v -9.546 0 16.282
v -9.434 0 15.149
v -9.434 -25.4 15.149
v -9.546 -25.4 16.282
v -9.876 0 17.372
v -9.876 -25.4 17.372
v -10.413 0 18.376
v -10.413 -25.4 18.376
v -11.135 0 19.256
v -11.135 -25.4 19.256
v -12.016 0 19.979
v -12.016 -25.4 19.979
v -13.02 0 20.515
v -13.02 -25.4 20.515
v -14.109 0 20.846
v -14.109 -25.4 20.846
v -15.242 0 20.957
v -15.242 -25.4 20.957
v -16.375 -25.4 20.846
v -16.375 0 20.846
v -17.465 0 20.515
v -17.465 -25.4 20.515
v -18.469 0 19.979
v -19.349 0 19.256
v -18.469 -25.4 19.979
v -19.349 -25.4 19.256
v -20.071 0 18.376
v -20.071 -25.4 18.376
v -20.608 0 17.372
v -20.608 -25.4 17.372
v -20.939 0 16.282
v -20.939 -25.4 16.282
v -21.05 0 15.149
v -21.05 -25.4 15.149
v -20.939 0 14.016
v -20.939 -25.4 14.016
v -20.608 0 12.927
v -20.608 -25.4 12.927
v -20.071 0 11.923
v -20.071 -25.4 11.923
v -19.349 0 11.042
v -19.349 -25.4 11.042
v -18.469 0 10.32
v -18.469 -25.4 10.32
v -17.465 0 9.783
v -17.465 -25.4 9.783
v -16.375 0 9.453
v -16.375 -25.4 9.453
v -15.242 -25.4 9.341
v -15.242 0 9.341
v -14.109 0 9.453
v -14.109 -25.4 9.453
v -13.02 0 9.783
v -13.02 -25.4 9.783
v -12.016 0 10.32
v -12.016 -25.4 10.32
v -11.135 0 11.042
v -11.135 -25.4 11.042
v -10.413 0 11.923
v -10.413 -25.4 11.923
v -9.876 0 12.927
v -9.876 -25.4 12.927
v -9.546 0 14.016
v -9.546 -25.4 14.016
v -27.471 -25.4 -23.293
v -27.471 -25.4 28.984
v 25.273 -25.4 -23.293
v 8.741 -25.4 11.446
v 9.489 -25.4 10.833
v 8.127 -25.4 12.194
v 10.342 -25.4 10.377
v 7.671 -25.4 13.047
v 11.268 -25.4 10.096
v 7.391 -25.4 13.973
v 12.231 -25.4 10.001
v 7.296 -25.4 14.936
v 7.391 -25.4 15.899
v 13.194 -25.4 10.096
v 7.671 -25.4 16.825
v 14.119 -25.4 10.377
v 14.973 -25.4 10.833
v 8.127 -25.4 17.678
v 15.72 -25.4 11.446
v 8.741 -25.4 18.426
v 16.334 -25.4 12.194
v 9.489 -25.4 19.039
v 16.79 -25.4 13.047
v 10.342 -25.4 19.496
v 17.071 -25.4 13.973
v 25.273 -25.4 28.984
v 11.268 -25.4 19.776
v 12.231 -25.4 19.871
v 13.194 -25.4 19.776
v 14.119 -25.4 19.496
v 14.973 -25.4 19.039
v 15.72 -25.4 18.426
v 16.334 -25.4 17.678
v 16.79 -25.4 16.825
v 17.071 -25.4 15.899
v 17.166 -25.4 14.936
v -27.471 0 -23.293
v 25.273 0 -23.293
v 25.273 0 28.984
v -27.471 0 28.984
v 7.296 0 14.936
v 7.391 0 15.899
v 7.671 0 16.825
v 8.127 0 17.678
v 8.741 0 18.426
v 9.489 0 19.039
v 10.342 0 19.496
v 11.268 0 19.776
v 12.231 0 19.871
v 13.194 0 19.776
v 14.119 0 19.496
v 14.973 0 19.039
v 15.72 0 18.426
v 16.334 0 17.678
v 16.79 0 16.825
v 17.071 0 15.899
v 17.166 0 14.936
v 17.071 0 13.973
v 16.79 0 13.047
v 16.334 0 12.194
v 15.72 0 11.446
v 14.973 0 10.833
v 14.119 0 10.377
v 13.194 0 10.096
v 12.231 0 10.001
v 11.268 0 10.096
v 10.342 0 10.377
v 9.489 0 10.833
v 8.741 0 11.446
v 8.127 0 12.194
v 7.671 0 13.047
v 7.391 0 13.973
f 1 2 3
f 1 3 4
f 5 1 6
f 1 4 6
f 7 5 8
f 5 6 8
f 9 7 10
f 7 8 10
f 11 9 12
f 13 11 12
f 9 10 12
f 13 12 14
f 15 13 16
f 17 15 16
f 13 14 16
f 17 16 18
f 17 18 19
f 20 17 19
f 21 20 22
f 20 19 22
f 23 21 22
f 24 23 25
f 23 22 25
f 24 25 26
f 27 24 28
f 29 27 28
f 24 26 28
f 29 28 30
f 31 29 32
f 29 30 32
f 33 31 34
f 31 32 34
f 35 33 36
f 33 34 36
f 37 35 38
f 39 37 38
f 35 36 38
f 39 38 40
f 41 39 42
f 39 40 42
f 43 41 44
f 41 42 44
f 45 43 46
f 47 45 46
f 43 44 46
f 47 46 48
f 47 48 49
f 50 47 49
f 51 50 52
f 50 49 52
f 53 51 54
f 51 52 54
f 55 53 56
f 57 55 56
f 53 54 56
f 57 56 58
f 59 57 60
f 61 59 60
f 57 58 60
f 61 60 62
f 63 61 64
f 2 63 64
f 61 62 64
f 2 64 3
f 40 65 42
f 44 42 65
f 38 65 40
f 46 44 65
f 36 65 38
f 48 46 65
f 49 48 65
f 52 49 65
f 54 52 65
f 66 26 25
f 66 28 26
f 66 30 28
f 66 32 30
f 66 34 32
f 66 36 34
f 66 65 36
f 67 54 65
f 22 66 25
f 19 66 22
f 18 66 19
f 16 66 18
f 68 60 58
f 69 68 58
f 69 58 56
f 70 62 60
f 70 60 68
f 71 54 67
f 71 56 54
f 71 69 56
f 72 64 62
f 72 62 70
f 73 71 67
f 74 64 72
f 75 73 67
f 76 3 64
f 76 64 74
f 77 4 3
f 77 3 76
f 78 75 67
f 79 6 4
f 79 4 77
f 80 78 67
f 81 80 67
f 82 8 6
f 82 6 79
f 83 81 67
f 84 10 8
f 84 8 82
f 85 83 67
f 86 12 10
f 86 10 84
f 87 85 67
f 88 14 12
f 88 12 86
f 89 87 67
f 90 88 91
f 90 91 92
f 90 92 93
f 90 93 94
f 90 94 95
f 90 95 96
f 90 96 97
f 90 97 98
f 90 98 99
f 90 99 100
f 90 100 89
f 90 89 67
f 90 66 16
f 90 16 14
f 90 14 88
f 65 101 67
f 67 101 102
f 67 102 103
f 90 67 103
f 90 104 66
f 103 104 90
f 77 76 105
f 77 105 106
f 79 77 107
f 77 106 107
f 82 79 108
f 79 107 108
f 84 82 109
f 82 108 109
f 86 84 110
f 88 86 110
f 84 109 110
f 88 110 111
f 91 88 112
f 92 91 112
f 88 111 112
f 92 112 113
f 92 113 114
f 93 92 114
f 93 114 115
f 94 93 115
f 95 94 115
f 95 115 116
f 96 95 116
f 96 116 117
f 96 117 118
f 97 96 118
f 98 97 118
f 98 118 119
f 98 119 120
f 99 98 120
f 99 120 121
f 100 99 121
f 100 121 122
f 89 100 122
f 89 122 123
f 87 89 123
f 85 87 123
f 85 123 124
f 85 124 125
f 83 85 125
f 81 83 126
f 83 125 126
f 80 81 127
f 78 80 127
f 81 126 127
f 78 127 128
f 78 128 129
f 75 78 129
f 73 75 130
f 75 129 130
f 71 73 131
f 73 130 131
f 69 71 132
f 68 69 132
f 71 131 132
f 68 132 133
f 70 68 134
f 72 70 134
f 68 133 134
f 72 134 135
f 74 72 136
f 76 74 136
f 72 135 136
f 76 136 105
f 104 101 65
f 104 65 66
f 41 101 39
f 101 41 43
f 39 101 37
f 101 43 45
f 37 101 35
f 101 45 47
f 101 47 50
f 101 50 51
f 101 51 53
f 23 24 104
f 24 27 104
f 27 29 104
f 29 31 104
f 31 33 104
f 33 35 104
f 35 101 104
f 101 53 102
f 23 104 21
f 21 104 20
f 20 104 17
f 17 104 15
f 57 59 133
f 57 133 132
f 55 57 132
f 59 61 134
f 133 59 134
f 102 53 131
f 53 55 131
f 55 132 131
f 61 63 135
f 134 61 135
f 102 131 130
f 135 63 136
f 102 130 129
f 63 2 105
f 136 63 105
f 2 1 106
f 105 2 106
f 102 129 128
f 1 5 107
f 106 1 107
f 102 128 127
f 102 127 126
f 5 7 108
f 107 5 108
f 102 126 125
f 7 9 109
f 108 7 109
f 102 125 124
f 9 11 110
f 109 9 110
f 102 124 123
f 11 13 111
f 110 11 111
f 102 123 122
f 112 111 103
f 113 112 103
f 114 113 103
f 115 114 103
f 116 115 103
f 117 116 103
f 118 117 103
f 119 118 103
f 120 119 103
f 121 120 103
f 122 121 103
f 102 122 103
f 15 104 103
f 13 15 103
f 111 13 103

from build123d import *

# Parameters (mm, degrees)
F0_W     = 52.7440756559
F0_H     = 52.2768497467
F1_DEPTH = 25.4
F2_R     = 4.8102139617
F3_DEPTH = 126.0972395539
F4_R     = 4.9351190146
F5_DEPTH = 76.2
F6_R     = 5.8080274439
F8_DEPTH = 25.4


# Not quite as in the source:
# - the program builds the solid bodies; features that only make, move or delete a surface that nothing else refers to are left out


with BuildPart() as f1:
    # F0 (on Front) → F1 (new body)
    with BuildSketch(Plane.XZ):
        with Locations((-1.0988339782, 2.8451383114)):
            Rectangle(F0_W, F0_H)
    extrude(amount=F1_DEPTH)

    # F2 (on Front) → F3 (cut)
    with BuildSketch(Plane.XZ):
        with Locations((-12.8197297454, 11.39511168)):
            Circle(F2_R)
    extrude(amount=-F3_DEPTH, mode=Mode.SUBTRACT)

    # F4 (on face) → F5 (cut)
    with BuildSketch(Plane(origin=(0, 0, 0), x_dir=(-1, 0, 0), z_dir=(0, 1, 0))):
        with Locations((-12.2308423743, 14.9360494688)):
            Circle(F4_R)
    extrude(amount=-F5_DEPTH, mode=Mode.SUBTRACT)

    # F6 (on face) → F8 (cut)
    with BuildSketch(Plane.XZ.offset(25.4)):
        with Locations((-15.2422711253, 15.1493921876)):
            Circle(F6_R)
    extrude(amount=-F8_DEPTH, mode=Mode.SUBTRACT)


solid = f1.part
